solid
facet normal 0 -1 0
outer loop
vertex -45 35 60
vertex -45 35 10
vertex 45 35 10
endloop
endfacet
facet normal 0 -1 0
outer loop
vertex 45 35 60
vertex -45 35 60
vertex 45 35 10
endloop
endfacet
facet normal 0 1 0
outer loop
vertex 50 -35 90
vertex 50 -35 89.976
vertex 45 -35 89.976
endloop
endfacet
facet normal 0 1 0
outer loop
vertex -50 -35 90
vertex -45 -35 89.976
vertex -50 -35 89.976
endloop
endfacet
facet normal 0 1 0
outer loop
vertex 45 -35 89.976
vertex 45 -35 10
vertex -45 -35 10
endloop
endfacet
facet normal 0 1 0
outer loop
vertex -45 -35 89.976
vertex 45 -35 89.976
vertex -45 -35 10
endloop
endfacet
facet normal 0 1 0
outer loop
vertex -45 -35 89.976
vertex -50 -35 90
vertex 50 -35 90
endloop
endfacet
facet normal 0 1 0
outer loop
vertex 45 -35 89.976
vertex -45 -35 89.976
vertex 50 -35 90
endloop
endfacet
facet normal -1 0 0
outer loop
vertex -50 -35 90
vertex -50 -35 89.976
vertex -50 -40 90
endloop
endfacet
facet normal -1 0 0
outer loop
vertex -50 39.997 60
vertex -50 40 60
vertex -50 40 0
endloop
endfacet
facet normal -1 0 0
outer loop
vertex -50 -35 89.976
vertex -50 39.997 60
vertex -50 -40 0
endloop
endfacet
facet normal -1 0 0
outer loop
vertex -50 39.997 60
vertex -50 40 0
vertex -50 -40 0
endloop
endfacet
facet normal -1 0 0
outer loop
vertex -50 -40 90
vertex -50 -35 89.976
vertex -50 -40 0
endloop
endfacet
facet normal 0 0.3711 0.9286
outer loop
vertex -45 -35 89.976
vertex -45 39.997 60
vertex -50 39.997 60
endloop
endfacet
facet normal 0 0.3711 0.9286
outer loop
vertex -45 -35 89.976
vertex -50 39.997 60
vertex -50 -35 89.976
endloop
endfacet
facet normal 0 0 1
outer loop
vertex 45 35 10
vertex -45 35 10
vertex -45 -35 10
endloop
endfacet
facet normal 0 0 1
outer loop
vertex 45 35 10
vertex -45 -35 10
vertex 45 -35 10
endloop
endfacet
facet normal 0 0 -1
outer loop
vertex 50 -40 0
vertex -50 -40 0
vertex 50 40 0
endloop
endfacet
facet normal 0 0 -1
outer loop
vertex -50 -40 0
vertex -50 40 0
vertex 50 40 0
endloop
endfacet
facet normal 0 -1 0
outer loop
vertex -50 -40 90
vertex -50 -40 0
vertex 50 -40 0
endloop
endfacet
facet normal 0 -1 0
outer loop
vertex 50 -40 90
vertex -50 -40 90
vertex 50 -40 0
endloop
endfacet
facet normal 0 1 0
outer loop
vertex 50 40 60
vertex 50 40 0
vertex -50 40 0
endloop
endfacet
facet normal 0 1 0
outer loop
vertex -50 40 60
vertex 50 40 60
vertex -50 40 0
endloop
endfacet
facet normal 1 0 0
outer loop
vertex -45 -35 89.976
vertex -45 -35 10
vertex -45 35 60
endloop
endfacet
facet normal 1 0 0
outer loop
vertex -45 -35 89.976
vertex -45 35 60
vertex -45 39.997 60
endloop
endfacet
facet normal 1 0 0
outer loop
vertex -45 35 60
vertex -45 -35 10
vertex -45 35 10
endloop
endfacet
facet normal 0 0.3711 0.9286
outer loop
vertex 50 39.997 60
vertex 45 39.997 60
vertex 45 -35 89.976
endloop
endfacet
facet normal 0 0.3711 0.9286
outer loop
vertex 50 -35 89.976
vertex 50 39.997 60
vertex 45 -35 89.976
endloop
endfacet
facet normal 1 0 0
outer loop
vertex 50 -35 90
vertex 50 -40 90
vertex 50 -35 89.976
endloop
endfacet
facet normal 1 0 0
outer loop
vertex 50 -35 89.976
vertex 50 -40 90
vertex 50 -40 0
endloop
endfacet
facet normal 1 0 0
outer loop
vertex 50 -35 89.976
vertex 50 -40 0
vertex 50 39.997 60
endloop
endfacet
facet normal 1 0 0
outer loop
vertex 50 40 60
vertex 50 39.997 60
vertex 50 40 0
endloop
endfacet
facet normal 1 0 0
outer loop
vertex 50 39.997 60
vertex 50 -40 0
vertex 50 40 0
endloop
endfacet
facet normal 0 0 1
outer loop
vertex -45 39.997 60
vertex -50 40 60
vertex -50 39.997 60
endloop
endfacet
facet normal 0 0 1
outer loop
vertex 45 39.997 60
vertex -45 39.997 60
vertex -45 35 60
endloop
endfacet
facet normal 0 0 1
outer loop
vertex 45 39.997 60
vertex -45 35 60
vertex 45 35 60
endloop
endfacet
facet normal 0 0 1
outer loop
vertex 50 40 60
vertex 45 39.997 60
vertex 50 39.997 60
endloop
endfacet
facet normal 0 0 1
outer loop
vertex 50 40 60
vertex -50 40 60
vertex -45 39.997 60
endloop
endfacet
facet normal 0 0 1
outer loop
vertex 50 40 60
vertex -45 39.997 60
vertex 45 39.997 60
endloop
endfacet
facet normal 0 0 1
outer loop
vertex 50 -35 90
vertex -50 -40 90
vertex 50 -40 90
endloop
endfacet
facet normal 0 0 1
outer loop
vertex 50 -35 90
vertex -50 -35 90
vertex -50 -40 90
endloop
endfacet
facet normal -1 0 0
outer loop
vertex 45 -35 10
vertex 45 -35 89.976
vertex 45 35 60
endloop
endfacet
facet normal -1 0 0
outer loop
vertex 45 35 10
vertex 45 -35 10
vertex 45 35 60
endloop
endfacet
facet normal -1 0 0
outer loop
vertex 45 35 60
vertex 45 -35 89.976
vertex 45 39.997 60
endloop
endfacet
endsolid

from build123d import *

# Parameters (mm, degrees)
F1_DEPTH = 60
F0_W     = 90
F0_H     = 70
F2_DEPTH = 10
F3_DEPTH = 90
F5_START = 45
F5_DEPTH = 5
F6_START = -45
F6_DEPTH = 5


with BuildPart() as f1:
    # F0 (on Top) → F1 (new body)
    with BuildSketch(Plane.XY):
        Polygon((45, -35), (50, -35), (50, 40), (-50, 40), (-50, -35), (-45, -35), (-45, 35), (45, 35), align=None)
    extrude(amount=F1_DEPTH)

    # F0 (on Top) → F2 (join)
    with BuildSketch(Plane.XY):
        Rectangle(F0_W, F0_H)
    extrude(amount=F2_DEPTH)

    # F0 (on Top) → F3 (join)
    with BuildSketch(Plane.XY):
        Polygon((-50, -40), (50, -40), (50, -35), (45, -35), (-45, -35), (-50, -35), align=None)
    extrude(amount=F3_DEPTH)

    # F4 (on Right) → F5 (join)
    with BuildSketch(Plane.YZ.offset(F5_START)):
        Polygon((-35.0263789296, 89.9869129062), (-35.307901961, 59.999383986), (39.9987436831, 59.999383986), align=None)
    extrude(amount=F5_DEPTH)

    # F4 (on Right) → F6 (join)
    with BuildSketch(Plane.YZ.offset(F6_START)):
        Polygon((-35.0263789296, 89.9869129062), (-35.307901961, 59.999383986), (39.9987436831, 59.999383986), align=None)
    extrude(amount=-F6_DEPTH)


solid = f1.part
